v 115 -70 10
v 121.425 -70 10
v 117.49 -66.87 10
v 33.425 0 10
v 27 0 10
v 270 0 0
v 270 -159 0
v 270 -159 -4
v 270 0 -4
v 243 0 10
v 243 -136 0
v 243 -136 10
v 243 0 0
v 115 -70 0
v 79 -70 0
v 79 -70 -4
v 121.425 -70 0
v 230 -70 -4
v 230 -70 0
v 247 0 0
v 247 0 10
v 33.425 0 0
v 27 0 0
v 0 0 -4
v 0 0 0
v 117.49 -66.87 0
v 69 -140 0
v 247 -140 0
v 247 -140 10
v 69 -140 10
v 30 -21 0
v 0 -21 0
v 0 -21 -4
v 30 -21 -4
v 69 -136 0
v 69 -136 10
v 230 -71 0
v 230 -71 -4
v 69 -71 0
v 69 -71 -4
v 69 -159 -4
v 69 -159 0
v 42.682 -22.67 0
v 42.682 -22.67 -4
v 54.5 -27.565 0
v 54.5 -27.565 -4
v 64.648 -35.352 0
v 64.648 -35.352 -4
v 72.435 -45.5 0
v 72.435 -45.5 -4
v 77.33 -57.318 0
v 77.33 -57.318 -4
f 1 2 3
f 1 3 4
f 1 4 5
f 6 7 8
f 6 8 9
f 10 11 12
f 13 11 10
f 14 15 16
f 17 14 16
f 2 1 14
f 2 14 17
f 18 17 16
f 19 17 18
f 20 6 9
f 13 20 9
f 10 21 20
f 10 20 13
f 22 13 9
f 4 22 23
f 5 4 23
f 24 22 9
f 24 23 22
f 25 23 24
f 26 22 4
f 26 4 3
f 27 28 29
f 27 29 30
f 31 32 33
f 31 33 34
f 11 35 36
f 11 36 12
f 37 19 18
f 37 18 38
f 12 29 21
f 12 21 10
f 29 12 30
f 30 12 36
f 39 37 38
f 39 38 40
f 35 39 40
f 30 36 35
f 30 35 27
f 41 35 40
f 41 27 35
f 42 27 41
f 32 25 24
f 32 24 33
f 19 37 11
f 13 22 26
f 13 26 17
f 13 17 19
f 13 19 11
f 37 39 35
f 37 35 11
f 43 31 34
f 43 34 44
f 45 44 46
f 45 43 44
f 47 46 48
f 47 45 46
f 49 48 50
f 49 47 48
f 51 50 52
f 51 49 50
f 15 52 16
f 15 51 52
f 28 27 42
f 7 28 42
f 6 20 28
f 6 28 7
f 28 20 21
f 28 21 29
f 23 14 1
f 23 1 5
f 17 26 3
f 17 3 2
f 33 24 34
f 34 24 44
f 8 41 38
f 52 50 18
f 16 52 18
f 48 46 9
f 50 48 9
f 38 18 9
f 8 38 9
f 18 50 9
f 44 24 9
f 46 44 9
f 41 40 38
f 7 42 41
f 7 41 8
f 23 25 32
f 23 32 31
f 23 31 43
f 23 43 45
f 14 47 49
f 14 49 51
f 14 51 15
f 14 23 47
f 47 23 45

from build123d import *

# Parameters (mm, degrees)
BOSS_EXTRUDE1_DEPTH = 4
BOSS_EXTRUDE2_DEPTH = 10


with BuildPart() as part:
    # Sketch1 → Boss-Extrude1 (new body)
    with BuildSketch(Plane.XY):
        with BuildLine():
            Line((270, 0), (0, 0))
            Line((0, 0), (0, -21))
            Line((0, -21), (30, -21))
            ThreePointArc((30, -21), (64.648232278, -35.351767722), (79, -70))
            Line((79, -70), (230, -70))
            Line((230, -70), (270, -70))
            Line((270, -70), (270, 0))
        make_face()
        Polygon((270, -159), (270, -70), (230, -70), (230, -71), (69, -71), (69, -159), align=None)
    extrude(amount=-BOSS_EXTRUDE1_DEPTH)

    # Sketch2 → Boss-Extrude2 (add)
    with BuildSketch(Plane.XY):
        Polygon((247, 0), (247, -140), (69, -140), (69, -136), (243, -136), (243, 0), align=None)
        Polygon((115, -70), (27, 0), (33.425459564, 0), (117.490094263, -66.869595783), (121.425459564, -70), align=None)
    extrude(amount=BOSS_EXTRUDE2_DEPTH)


solid = part.part
